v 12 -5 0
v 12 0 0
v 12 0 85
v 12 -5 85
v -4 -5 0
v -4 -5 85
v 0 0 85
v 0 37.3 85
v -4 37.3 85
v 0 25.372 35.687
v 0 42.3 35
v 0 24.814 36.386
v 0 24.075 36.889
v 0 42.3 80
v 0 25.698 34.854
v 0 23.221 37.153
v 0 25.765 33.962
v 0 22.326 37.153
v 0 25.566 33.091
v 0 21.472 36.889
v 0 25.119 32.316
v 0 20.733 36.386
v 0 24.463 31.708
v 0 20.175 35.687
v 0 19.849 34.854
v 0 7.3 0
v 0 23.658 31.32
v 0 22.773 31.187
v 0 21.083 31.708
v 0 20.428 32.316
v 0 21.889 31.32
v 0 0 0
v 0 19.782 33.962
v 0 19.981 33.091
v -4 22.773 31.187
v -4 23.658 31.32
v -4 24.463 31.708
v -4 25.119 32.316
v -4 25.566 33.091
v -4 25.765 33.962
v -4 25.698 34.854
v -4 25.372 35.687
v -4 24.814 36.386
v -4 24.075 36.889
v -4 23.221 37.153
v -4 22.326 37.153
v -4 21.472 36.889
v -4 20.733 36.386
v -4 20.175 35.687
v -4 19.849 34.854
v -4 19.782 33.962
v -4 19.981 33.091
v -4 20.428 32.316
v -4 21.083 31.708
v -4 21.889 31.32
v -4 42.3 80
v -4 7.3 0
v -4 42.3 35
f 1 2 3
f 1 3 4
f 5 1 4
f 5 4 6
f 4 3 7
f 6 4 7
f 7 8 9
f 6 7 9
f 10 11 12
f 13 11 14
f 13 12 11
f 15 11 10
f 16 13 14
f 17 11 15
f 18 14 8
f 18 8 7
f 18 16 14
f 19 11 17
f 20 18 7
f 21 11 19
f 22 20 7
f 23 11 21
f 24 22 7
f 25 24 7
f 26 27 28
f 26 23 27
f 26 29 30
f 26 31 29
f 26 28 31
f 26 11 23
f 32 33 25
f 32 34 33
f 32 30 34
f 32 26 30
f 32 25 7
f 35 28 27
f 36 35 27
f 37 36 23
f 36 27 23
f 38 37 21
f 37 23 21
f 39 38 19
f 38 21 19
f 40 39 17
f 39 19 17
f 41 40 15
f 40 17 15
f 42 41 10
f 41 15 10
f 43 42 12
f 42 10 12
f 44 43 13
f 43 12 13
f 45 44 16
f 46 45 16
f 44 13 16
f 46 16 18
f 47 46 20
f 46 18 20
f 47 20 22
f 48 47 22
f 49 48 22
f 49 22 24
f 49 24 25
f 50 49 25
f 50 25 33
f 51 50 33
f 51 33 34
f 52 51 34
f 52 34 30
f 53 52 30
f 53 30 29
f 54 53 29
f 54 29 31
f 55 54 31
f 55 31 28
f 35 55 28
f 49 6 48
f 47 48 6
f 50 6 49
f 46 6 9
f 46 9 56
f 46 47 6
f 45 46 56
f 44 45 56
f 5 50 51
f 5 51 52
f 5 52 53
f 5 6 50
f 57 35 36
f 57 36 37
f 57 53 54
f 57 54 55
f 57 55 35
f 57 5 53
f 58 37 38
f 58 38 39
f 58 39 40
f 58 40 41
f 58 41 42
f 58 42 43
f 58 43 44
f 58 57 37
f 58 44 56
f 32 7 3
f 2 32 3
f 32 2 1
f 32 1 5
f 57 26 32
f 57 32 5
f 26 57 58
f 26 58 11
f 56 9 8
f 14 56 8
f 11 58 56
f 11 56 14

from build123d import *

# Parameters (mm, degrees)
EXTRUDE_1_DEPTH     = 85
SKETCH_2_R          = 3
CUT_EXTRUDE_1_DEPTH = 96.698955062
CHAMFER_1_SIZE      = 35
CHAMFER_2_SIZE      = 5


with BuildPart() as part:
    # Эскиз1 → Вытянуть1 (new body)
    with BuildSketch(Plane.XY):
        Polygon((0, 0), (12, 0), (12, -5), (-4, -5), (-4, 42.3), (0, 42.3), align=None)
    extrude(amount=EXTRUDE_1_DEPTH)

    # Эскиз2 → Вырез-Вытянуть1 (cut, through all)
    with BuildSketch(Plane(origin=(0, 0, 0), x_dir=(0, 0, -1), z_dir=(1, 0, 0))):
        with Locations((-34.186530765, 22.773427237)):
            Circle(SKETCH_2_R)
    extrude(amount=-CUT_EXTRUDE_1_DEPTH, mode=Mode.SUBTRACT)

    # Фаска1
    chamfer_1_edges = [part.edges().sort_by_distance(p)[0] for p in [
        (-2, 42.3, 0),
    ]]
    chamfer(chamfer_1_edges, length=CHAMFER_1_SIZE)

    # Фаска2
    chamfer_2_edges = [part.edges().sort_by_distance(p)[0] for p in [
        (-2, 42.3, 85),
    ]]
    chamfer(chamfer_2_edges, length=CHAMFER_2_SIZE)


solid = part.part
